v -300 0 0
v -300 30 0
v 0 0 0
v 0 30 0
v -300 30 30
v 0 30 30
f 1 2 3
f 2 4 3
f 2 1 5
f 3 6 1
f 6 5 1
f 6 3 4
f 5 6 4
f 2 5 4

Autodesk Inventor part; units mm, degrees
ref_plane "YZ Plane" through (0, 0, 0) normal (1, 0, 0) x (0, 1, 0)
ref_plane "XZ Plane" through (0, 0, 0) normal (0, 1, 0) x (-1, 0, 0)
ref_plane "XY Plane" through (0, 0, 0) normal (0, 0, 1) x (1, 0, 0)
sketch "Sketch1" plane through (0, 0, 0) normal (1, 0, 0) x (0, 1, 0)
  line L0 (0, 0) -> (30, 0)
  line L1 (30, 0) -> (30, -20)
  line L2 (30, -20) -> (0, -20)
  line L3 (0, -20) -> (0, 0)
  dimension "d0" = 20
  dimension "d1" = 30
extrude "Extrusion1" add sketch "Sketch1" against normal blind 300
sketch "Sketch3" plane through (0, 0, 0) normal (1, 0, 0) x (0, 0, -1)
  line L0 (0, 0) -> (0, 30) projected
  line L1 (0, 0) -> (0, 30)
  line L2 (0, 30) -> (-30, 30)
  line L3 (-30, 30) -> (0, 0)
  dimension "d4" = 30
  dimension "d5" = 45
extrude "Extrusion2" add sketch "Sketch3" along normal blind 300 from surface at -300
sketch "Sketch4" plane through (0, 0, 0) normal (1, 0, 0) x (0, 0, -1)
  line L0 (0, 0) -> (20, 0)
  line L1 (20, 0) -> (20, 30)
  line L2 (20, 30) -> (0, 30)
  line L3 (0, 30) -> (0, 0)
extrude "Extrusion3" cut sketch "Sketch4" against normal through all
properties part number "cale_monnayeur"
